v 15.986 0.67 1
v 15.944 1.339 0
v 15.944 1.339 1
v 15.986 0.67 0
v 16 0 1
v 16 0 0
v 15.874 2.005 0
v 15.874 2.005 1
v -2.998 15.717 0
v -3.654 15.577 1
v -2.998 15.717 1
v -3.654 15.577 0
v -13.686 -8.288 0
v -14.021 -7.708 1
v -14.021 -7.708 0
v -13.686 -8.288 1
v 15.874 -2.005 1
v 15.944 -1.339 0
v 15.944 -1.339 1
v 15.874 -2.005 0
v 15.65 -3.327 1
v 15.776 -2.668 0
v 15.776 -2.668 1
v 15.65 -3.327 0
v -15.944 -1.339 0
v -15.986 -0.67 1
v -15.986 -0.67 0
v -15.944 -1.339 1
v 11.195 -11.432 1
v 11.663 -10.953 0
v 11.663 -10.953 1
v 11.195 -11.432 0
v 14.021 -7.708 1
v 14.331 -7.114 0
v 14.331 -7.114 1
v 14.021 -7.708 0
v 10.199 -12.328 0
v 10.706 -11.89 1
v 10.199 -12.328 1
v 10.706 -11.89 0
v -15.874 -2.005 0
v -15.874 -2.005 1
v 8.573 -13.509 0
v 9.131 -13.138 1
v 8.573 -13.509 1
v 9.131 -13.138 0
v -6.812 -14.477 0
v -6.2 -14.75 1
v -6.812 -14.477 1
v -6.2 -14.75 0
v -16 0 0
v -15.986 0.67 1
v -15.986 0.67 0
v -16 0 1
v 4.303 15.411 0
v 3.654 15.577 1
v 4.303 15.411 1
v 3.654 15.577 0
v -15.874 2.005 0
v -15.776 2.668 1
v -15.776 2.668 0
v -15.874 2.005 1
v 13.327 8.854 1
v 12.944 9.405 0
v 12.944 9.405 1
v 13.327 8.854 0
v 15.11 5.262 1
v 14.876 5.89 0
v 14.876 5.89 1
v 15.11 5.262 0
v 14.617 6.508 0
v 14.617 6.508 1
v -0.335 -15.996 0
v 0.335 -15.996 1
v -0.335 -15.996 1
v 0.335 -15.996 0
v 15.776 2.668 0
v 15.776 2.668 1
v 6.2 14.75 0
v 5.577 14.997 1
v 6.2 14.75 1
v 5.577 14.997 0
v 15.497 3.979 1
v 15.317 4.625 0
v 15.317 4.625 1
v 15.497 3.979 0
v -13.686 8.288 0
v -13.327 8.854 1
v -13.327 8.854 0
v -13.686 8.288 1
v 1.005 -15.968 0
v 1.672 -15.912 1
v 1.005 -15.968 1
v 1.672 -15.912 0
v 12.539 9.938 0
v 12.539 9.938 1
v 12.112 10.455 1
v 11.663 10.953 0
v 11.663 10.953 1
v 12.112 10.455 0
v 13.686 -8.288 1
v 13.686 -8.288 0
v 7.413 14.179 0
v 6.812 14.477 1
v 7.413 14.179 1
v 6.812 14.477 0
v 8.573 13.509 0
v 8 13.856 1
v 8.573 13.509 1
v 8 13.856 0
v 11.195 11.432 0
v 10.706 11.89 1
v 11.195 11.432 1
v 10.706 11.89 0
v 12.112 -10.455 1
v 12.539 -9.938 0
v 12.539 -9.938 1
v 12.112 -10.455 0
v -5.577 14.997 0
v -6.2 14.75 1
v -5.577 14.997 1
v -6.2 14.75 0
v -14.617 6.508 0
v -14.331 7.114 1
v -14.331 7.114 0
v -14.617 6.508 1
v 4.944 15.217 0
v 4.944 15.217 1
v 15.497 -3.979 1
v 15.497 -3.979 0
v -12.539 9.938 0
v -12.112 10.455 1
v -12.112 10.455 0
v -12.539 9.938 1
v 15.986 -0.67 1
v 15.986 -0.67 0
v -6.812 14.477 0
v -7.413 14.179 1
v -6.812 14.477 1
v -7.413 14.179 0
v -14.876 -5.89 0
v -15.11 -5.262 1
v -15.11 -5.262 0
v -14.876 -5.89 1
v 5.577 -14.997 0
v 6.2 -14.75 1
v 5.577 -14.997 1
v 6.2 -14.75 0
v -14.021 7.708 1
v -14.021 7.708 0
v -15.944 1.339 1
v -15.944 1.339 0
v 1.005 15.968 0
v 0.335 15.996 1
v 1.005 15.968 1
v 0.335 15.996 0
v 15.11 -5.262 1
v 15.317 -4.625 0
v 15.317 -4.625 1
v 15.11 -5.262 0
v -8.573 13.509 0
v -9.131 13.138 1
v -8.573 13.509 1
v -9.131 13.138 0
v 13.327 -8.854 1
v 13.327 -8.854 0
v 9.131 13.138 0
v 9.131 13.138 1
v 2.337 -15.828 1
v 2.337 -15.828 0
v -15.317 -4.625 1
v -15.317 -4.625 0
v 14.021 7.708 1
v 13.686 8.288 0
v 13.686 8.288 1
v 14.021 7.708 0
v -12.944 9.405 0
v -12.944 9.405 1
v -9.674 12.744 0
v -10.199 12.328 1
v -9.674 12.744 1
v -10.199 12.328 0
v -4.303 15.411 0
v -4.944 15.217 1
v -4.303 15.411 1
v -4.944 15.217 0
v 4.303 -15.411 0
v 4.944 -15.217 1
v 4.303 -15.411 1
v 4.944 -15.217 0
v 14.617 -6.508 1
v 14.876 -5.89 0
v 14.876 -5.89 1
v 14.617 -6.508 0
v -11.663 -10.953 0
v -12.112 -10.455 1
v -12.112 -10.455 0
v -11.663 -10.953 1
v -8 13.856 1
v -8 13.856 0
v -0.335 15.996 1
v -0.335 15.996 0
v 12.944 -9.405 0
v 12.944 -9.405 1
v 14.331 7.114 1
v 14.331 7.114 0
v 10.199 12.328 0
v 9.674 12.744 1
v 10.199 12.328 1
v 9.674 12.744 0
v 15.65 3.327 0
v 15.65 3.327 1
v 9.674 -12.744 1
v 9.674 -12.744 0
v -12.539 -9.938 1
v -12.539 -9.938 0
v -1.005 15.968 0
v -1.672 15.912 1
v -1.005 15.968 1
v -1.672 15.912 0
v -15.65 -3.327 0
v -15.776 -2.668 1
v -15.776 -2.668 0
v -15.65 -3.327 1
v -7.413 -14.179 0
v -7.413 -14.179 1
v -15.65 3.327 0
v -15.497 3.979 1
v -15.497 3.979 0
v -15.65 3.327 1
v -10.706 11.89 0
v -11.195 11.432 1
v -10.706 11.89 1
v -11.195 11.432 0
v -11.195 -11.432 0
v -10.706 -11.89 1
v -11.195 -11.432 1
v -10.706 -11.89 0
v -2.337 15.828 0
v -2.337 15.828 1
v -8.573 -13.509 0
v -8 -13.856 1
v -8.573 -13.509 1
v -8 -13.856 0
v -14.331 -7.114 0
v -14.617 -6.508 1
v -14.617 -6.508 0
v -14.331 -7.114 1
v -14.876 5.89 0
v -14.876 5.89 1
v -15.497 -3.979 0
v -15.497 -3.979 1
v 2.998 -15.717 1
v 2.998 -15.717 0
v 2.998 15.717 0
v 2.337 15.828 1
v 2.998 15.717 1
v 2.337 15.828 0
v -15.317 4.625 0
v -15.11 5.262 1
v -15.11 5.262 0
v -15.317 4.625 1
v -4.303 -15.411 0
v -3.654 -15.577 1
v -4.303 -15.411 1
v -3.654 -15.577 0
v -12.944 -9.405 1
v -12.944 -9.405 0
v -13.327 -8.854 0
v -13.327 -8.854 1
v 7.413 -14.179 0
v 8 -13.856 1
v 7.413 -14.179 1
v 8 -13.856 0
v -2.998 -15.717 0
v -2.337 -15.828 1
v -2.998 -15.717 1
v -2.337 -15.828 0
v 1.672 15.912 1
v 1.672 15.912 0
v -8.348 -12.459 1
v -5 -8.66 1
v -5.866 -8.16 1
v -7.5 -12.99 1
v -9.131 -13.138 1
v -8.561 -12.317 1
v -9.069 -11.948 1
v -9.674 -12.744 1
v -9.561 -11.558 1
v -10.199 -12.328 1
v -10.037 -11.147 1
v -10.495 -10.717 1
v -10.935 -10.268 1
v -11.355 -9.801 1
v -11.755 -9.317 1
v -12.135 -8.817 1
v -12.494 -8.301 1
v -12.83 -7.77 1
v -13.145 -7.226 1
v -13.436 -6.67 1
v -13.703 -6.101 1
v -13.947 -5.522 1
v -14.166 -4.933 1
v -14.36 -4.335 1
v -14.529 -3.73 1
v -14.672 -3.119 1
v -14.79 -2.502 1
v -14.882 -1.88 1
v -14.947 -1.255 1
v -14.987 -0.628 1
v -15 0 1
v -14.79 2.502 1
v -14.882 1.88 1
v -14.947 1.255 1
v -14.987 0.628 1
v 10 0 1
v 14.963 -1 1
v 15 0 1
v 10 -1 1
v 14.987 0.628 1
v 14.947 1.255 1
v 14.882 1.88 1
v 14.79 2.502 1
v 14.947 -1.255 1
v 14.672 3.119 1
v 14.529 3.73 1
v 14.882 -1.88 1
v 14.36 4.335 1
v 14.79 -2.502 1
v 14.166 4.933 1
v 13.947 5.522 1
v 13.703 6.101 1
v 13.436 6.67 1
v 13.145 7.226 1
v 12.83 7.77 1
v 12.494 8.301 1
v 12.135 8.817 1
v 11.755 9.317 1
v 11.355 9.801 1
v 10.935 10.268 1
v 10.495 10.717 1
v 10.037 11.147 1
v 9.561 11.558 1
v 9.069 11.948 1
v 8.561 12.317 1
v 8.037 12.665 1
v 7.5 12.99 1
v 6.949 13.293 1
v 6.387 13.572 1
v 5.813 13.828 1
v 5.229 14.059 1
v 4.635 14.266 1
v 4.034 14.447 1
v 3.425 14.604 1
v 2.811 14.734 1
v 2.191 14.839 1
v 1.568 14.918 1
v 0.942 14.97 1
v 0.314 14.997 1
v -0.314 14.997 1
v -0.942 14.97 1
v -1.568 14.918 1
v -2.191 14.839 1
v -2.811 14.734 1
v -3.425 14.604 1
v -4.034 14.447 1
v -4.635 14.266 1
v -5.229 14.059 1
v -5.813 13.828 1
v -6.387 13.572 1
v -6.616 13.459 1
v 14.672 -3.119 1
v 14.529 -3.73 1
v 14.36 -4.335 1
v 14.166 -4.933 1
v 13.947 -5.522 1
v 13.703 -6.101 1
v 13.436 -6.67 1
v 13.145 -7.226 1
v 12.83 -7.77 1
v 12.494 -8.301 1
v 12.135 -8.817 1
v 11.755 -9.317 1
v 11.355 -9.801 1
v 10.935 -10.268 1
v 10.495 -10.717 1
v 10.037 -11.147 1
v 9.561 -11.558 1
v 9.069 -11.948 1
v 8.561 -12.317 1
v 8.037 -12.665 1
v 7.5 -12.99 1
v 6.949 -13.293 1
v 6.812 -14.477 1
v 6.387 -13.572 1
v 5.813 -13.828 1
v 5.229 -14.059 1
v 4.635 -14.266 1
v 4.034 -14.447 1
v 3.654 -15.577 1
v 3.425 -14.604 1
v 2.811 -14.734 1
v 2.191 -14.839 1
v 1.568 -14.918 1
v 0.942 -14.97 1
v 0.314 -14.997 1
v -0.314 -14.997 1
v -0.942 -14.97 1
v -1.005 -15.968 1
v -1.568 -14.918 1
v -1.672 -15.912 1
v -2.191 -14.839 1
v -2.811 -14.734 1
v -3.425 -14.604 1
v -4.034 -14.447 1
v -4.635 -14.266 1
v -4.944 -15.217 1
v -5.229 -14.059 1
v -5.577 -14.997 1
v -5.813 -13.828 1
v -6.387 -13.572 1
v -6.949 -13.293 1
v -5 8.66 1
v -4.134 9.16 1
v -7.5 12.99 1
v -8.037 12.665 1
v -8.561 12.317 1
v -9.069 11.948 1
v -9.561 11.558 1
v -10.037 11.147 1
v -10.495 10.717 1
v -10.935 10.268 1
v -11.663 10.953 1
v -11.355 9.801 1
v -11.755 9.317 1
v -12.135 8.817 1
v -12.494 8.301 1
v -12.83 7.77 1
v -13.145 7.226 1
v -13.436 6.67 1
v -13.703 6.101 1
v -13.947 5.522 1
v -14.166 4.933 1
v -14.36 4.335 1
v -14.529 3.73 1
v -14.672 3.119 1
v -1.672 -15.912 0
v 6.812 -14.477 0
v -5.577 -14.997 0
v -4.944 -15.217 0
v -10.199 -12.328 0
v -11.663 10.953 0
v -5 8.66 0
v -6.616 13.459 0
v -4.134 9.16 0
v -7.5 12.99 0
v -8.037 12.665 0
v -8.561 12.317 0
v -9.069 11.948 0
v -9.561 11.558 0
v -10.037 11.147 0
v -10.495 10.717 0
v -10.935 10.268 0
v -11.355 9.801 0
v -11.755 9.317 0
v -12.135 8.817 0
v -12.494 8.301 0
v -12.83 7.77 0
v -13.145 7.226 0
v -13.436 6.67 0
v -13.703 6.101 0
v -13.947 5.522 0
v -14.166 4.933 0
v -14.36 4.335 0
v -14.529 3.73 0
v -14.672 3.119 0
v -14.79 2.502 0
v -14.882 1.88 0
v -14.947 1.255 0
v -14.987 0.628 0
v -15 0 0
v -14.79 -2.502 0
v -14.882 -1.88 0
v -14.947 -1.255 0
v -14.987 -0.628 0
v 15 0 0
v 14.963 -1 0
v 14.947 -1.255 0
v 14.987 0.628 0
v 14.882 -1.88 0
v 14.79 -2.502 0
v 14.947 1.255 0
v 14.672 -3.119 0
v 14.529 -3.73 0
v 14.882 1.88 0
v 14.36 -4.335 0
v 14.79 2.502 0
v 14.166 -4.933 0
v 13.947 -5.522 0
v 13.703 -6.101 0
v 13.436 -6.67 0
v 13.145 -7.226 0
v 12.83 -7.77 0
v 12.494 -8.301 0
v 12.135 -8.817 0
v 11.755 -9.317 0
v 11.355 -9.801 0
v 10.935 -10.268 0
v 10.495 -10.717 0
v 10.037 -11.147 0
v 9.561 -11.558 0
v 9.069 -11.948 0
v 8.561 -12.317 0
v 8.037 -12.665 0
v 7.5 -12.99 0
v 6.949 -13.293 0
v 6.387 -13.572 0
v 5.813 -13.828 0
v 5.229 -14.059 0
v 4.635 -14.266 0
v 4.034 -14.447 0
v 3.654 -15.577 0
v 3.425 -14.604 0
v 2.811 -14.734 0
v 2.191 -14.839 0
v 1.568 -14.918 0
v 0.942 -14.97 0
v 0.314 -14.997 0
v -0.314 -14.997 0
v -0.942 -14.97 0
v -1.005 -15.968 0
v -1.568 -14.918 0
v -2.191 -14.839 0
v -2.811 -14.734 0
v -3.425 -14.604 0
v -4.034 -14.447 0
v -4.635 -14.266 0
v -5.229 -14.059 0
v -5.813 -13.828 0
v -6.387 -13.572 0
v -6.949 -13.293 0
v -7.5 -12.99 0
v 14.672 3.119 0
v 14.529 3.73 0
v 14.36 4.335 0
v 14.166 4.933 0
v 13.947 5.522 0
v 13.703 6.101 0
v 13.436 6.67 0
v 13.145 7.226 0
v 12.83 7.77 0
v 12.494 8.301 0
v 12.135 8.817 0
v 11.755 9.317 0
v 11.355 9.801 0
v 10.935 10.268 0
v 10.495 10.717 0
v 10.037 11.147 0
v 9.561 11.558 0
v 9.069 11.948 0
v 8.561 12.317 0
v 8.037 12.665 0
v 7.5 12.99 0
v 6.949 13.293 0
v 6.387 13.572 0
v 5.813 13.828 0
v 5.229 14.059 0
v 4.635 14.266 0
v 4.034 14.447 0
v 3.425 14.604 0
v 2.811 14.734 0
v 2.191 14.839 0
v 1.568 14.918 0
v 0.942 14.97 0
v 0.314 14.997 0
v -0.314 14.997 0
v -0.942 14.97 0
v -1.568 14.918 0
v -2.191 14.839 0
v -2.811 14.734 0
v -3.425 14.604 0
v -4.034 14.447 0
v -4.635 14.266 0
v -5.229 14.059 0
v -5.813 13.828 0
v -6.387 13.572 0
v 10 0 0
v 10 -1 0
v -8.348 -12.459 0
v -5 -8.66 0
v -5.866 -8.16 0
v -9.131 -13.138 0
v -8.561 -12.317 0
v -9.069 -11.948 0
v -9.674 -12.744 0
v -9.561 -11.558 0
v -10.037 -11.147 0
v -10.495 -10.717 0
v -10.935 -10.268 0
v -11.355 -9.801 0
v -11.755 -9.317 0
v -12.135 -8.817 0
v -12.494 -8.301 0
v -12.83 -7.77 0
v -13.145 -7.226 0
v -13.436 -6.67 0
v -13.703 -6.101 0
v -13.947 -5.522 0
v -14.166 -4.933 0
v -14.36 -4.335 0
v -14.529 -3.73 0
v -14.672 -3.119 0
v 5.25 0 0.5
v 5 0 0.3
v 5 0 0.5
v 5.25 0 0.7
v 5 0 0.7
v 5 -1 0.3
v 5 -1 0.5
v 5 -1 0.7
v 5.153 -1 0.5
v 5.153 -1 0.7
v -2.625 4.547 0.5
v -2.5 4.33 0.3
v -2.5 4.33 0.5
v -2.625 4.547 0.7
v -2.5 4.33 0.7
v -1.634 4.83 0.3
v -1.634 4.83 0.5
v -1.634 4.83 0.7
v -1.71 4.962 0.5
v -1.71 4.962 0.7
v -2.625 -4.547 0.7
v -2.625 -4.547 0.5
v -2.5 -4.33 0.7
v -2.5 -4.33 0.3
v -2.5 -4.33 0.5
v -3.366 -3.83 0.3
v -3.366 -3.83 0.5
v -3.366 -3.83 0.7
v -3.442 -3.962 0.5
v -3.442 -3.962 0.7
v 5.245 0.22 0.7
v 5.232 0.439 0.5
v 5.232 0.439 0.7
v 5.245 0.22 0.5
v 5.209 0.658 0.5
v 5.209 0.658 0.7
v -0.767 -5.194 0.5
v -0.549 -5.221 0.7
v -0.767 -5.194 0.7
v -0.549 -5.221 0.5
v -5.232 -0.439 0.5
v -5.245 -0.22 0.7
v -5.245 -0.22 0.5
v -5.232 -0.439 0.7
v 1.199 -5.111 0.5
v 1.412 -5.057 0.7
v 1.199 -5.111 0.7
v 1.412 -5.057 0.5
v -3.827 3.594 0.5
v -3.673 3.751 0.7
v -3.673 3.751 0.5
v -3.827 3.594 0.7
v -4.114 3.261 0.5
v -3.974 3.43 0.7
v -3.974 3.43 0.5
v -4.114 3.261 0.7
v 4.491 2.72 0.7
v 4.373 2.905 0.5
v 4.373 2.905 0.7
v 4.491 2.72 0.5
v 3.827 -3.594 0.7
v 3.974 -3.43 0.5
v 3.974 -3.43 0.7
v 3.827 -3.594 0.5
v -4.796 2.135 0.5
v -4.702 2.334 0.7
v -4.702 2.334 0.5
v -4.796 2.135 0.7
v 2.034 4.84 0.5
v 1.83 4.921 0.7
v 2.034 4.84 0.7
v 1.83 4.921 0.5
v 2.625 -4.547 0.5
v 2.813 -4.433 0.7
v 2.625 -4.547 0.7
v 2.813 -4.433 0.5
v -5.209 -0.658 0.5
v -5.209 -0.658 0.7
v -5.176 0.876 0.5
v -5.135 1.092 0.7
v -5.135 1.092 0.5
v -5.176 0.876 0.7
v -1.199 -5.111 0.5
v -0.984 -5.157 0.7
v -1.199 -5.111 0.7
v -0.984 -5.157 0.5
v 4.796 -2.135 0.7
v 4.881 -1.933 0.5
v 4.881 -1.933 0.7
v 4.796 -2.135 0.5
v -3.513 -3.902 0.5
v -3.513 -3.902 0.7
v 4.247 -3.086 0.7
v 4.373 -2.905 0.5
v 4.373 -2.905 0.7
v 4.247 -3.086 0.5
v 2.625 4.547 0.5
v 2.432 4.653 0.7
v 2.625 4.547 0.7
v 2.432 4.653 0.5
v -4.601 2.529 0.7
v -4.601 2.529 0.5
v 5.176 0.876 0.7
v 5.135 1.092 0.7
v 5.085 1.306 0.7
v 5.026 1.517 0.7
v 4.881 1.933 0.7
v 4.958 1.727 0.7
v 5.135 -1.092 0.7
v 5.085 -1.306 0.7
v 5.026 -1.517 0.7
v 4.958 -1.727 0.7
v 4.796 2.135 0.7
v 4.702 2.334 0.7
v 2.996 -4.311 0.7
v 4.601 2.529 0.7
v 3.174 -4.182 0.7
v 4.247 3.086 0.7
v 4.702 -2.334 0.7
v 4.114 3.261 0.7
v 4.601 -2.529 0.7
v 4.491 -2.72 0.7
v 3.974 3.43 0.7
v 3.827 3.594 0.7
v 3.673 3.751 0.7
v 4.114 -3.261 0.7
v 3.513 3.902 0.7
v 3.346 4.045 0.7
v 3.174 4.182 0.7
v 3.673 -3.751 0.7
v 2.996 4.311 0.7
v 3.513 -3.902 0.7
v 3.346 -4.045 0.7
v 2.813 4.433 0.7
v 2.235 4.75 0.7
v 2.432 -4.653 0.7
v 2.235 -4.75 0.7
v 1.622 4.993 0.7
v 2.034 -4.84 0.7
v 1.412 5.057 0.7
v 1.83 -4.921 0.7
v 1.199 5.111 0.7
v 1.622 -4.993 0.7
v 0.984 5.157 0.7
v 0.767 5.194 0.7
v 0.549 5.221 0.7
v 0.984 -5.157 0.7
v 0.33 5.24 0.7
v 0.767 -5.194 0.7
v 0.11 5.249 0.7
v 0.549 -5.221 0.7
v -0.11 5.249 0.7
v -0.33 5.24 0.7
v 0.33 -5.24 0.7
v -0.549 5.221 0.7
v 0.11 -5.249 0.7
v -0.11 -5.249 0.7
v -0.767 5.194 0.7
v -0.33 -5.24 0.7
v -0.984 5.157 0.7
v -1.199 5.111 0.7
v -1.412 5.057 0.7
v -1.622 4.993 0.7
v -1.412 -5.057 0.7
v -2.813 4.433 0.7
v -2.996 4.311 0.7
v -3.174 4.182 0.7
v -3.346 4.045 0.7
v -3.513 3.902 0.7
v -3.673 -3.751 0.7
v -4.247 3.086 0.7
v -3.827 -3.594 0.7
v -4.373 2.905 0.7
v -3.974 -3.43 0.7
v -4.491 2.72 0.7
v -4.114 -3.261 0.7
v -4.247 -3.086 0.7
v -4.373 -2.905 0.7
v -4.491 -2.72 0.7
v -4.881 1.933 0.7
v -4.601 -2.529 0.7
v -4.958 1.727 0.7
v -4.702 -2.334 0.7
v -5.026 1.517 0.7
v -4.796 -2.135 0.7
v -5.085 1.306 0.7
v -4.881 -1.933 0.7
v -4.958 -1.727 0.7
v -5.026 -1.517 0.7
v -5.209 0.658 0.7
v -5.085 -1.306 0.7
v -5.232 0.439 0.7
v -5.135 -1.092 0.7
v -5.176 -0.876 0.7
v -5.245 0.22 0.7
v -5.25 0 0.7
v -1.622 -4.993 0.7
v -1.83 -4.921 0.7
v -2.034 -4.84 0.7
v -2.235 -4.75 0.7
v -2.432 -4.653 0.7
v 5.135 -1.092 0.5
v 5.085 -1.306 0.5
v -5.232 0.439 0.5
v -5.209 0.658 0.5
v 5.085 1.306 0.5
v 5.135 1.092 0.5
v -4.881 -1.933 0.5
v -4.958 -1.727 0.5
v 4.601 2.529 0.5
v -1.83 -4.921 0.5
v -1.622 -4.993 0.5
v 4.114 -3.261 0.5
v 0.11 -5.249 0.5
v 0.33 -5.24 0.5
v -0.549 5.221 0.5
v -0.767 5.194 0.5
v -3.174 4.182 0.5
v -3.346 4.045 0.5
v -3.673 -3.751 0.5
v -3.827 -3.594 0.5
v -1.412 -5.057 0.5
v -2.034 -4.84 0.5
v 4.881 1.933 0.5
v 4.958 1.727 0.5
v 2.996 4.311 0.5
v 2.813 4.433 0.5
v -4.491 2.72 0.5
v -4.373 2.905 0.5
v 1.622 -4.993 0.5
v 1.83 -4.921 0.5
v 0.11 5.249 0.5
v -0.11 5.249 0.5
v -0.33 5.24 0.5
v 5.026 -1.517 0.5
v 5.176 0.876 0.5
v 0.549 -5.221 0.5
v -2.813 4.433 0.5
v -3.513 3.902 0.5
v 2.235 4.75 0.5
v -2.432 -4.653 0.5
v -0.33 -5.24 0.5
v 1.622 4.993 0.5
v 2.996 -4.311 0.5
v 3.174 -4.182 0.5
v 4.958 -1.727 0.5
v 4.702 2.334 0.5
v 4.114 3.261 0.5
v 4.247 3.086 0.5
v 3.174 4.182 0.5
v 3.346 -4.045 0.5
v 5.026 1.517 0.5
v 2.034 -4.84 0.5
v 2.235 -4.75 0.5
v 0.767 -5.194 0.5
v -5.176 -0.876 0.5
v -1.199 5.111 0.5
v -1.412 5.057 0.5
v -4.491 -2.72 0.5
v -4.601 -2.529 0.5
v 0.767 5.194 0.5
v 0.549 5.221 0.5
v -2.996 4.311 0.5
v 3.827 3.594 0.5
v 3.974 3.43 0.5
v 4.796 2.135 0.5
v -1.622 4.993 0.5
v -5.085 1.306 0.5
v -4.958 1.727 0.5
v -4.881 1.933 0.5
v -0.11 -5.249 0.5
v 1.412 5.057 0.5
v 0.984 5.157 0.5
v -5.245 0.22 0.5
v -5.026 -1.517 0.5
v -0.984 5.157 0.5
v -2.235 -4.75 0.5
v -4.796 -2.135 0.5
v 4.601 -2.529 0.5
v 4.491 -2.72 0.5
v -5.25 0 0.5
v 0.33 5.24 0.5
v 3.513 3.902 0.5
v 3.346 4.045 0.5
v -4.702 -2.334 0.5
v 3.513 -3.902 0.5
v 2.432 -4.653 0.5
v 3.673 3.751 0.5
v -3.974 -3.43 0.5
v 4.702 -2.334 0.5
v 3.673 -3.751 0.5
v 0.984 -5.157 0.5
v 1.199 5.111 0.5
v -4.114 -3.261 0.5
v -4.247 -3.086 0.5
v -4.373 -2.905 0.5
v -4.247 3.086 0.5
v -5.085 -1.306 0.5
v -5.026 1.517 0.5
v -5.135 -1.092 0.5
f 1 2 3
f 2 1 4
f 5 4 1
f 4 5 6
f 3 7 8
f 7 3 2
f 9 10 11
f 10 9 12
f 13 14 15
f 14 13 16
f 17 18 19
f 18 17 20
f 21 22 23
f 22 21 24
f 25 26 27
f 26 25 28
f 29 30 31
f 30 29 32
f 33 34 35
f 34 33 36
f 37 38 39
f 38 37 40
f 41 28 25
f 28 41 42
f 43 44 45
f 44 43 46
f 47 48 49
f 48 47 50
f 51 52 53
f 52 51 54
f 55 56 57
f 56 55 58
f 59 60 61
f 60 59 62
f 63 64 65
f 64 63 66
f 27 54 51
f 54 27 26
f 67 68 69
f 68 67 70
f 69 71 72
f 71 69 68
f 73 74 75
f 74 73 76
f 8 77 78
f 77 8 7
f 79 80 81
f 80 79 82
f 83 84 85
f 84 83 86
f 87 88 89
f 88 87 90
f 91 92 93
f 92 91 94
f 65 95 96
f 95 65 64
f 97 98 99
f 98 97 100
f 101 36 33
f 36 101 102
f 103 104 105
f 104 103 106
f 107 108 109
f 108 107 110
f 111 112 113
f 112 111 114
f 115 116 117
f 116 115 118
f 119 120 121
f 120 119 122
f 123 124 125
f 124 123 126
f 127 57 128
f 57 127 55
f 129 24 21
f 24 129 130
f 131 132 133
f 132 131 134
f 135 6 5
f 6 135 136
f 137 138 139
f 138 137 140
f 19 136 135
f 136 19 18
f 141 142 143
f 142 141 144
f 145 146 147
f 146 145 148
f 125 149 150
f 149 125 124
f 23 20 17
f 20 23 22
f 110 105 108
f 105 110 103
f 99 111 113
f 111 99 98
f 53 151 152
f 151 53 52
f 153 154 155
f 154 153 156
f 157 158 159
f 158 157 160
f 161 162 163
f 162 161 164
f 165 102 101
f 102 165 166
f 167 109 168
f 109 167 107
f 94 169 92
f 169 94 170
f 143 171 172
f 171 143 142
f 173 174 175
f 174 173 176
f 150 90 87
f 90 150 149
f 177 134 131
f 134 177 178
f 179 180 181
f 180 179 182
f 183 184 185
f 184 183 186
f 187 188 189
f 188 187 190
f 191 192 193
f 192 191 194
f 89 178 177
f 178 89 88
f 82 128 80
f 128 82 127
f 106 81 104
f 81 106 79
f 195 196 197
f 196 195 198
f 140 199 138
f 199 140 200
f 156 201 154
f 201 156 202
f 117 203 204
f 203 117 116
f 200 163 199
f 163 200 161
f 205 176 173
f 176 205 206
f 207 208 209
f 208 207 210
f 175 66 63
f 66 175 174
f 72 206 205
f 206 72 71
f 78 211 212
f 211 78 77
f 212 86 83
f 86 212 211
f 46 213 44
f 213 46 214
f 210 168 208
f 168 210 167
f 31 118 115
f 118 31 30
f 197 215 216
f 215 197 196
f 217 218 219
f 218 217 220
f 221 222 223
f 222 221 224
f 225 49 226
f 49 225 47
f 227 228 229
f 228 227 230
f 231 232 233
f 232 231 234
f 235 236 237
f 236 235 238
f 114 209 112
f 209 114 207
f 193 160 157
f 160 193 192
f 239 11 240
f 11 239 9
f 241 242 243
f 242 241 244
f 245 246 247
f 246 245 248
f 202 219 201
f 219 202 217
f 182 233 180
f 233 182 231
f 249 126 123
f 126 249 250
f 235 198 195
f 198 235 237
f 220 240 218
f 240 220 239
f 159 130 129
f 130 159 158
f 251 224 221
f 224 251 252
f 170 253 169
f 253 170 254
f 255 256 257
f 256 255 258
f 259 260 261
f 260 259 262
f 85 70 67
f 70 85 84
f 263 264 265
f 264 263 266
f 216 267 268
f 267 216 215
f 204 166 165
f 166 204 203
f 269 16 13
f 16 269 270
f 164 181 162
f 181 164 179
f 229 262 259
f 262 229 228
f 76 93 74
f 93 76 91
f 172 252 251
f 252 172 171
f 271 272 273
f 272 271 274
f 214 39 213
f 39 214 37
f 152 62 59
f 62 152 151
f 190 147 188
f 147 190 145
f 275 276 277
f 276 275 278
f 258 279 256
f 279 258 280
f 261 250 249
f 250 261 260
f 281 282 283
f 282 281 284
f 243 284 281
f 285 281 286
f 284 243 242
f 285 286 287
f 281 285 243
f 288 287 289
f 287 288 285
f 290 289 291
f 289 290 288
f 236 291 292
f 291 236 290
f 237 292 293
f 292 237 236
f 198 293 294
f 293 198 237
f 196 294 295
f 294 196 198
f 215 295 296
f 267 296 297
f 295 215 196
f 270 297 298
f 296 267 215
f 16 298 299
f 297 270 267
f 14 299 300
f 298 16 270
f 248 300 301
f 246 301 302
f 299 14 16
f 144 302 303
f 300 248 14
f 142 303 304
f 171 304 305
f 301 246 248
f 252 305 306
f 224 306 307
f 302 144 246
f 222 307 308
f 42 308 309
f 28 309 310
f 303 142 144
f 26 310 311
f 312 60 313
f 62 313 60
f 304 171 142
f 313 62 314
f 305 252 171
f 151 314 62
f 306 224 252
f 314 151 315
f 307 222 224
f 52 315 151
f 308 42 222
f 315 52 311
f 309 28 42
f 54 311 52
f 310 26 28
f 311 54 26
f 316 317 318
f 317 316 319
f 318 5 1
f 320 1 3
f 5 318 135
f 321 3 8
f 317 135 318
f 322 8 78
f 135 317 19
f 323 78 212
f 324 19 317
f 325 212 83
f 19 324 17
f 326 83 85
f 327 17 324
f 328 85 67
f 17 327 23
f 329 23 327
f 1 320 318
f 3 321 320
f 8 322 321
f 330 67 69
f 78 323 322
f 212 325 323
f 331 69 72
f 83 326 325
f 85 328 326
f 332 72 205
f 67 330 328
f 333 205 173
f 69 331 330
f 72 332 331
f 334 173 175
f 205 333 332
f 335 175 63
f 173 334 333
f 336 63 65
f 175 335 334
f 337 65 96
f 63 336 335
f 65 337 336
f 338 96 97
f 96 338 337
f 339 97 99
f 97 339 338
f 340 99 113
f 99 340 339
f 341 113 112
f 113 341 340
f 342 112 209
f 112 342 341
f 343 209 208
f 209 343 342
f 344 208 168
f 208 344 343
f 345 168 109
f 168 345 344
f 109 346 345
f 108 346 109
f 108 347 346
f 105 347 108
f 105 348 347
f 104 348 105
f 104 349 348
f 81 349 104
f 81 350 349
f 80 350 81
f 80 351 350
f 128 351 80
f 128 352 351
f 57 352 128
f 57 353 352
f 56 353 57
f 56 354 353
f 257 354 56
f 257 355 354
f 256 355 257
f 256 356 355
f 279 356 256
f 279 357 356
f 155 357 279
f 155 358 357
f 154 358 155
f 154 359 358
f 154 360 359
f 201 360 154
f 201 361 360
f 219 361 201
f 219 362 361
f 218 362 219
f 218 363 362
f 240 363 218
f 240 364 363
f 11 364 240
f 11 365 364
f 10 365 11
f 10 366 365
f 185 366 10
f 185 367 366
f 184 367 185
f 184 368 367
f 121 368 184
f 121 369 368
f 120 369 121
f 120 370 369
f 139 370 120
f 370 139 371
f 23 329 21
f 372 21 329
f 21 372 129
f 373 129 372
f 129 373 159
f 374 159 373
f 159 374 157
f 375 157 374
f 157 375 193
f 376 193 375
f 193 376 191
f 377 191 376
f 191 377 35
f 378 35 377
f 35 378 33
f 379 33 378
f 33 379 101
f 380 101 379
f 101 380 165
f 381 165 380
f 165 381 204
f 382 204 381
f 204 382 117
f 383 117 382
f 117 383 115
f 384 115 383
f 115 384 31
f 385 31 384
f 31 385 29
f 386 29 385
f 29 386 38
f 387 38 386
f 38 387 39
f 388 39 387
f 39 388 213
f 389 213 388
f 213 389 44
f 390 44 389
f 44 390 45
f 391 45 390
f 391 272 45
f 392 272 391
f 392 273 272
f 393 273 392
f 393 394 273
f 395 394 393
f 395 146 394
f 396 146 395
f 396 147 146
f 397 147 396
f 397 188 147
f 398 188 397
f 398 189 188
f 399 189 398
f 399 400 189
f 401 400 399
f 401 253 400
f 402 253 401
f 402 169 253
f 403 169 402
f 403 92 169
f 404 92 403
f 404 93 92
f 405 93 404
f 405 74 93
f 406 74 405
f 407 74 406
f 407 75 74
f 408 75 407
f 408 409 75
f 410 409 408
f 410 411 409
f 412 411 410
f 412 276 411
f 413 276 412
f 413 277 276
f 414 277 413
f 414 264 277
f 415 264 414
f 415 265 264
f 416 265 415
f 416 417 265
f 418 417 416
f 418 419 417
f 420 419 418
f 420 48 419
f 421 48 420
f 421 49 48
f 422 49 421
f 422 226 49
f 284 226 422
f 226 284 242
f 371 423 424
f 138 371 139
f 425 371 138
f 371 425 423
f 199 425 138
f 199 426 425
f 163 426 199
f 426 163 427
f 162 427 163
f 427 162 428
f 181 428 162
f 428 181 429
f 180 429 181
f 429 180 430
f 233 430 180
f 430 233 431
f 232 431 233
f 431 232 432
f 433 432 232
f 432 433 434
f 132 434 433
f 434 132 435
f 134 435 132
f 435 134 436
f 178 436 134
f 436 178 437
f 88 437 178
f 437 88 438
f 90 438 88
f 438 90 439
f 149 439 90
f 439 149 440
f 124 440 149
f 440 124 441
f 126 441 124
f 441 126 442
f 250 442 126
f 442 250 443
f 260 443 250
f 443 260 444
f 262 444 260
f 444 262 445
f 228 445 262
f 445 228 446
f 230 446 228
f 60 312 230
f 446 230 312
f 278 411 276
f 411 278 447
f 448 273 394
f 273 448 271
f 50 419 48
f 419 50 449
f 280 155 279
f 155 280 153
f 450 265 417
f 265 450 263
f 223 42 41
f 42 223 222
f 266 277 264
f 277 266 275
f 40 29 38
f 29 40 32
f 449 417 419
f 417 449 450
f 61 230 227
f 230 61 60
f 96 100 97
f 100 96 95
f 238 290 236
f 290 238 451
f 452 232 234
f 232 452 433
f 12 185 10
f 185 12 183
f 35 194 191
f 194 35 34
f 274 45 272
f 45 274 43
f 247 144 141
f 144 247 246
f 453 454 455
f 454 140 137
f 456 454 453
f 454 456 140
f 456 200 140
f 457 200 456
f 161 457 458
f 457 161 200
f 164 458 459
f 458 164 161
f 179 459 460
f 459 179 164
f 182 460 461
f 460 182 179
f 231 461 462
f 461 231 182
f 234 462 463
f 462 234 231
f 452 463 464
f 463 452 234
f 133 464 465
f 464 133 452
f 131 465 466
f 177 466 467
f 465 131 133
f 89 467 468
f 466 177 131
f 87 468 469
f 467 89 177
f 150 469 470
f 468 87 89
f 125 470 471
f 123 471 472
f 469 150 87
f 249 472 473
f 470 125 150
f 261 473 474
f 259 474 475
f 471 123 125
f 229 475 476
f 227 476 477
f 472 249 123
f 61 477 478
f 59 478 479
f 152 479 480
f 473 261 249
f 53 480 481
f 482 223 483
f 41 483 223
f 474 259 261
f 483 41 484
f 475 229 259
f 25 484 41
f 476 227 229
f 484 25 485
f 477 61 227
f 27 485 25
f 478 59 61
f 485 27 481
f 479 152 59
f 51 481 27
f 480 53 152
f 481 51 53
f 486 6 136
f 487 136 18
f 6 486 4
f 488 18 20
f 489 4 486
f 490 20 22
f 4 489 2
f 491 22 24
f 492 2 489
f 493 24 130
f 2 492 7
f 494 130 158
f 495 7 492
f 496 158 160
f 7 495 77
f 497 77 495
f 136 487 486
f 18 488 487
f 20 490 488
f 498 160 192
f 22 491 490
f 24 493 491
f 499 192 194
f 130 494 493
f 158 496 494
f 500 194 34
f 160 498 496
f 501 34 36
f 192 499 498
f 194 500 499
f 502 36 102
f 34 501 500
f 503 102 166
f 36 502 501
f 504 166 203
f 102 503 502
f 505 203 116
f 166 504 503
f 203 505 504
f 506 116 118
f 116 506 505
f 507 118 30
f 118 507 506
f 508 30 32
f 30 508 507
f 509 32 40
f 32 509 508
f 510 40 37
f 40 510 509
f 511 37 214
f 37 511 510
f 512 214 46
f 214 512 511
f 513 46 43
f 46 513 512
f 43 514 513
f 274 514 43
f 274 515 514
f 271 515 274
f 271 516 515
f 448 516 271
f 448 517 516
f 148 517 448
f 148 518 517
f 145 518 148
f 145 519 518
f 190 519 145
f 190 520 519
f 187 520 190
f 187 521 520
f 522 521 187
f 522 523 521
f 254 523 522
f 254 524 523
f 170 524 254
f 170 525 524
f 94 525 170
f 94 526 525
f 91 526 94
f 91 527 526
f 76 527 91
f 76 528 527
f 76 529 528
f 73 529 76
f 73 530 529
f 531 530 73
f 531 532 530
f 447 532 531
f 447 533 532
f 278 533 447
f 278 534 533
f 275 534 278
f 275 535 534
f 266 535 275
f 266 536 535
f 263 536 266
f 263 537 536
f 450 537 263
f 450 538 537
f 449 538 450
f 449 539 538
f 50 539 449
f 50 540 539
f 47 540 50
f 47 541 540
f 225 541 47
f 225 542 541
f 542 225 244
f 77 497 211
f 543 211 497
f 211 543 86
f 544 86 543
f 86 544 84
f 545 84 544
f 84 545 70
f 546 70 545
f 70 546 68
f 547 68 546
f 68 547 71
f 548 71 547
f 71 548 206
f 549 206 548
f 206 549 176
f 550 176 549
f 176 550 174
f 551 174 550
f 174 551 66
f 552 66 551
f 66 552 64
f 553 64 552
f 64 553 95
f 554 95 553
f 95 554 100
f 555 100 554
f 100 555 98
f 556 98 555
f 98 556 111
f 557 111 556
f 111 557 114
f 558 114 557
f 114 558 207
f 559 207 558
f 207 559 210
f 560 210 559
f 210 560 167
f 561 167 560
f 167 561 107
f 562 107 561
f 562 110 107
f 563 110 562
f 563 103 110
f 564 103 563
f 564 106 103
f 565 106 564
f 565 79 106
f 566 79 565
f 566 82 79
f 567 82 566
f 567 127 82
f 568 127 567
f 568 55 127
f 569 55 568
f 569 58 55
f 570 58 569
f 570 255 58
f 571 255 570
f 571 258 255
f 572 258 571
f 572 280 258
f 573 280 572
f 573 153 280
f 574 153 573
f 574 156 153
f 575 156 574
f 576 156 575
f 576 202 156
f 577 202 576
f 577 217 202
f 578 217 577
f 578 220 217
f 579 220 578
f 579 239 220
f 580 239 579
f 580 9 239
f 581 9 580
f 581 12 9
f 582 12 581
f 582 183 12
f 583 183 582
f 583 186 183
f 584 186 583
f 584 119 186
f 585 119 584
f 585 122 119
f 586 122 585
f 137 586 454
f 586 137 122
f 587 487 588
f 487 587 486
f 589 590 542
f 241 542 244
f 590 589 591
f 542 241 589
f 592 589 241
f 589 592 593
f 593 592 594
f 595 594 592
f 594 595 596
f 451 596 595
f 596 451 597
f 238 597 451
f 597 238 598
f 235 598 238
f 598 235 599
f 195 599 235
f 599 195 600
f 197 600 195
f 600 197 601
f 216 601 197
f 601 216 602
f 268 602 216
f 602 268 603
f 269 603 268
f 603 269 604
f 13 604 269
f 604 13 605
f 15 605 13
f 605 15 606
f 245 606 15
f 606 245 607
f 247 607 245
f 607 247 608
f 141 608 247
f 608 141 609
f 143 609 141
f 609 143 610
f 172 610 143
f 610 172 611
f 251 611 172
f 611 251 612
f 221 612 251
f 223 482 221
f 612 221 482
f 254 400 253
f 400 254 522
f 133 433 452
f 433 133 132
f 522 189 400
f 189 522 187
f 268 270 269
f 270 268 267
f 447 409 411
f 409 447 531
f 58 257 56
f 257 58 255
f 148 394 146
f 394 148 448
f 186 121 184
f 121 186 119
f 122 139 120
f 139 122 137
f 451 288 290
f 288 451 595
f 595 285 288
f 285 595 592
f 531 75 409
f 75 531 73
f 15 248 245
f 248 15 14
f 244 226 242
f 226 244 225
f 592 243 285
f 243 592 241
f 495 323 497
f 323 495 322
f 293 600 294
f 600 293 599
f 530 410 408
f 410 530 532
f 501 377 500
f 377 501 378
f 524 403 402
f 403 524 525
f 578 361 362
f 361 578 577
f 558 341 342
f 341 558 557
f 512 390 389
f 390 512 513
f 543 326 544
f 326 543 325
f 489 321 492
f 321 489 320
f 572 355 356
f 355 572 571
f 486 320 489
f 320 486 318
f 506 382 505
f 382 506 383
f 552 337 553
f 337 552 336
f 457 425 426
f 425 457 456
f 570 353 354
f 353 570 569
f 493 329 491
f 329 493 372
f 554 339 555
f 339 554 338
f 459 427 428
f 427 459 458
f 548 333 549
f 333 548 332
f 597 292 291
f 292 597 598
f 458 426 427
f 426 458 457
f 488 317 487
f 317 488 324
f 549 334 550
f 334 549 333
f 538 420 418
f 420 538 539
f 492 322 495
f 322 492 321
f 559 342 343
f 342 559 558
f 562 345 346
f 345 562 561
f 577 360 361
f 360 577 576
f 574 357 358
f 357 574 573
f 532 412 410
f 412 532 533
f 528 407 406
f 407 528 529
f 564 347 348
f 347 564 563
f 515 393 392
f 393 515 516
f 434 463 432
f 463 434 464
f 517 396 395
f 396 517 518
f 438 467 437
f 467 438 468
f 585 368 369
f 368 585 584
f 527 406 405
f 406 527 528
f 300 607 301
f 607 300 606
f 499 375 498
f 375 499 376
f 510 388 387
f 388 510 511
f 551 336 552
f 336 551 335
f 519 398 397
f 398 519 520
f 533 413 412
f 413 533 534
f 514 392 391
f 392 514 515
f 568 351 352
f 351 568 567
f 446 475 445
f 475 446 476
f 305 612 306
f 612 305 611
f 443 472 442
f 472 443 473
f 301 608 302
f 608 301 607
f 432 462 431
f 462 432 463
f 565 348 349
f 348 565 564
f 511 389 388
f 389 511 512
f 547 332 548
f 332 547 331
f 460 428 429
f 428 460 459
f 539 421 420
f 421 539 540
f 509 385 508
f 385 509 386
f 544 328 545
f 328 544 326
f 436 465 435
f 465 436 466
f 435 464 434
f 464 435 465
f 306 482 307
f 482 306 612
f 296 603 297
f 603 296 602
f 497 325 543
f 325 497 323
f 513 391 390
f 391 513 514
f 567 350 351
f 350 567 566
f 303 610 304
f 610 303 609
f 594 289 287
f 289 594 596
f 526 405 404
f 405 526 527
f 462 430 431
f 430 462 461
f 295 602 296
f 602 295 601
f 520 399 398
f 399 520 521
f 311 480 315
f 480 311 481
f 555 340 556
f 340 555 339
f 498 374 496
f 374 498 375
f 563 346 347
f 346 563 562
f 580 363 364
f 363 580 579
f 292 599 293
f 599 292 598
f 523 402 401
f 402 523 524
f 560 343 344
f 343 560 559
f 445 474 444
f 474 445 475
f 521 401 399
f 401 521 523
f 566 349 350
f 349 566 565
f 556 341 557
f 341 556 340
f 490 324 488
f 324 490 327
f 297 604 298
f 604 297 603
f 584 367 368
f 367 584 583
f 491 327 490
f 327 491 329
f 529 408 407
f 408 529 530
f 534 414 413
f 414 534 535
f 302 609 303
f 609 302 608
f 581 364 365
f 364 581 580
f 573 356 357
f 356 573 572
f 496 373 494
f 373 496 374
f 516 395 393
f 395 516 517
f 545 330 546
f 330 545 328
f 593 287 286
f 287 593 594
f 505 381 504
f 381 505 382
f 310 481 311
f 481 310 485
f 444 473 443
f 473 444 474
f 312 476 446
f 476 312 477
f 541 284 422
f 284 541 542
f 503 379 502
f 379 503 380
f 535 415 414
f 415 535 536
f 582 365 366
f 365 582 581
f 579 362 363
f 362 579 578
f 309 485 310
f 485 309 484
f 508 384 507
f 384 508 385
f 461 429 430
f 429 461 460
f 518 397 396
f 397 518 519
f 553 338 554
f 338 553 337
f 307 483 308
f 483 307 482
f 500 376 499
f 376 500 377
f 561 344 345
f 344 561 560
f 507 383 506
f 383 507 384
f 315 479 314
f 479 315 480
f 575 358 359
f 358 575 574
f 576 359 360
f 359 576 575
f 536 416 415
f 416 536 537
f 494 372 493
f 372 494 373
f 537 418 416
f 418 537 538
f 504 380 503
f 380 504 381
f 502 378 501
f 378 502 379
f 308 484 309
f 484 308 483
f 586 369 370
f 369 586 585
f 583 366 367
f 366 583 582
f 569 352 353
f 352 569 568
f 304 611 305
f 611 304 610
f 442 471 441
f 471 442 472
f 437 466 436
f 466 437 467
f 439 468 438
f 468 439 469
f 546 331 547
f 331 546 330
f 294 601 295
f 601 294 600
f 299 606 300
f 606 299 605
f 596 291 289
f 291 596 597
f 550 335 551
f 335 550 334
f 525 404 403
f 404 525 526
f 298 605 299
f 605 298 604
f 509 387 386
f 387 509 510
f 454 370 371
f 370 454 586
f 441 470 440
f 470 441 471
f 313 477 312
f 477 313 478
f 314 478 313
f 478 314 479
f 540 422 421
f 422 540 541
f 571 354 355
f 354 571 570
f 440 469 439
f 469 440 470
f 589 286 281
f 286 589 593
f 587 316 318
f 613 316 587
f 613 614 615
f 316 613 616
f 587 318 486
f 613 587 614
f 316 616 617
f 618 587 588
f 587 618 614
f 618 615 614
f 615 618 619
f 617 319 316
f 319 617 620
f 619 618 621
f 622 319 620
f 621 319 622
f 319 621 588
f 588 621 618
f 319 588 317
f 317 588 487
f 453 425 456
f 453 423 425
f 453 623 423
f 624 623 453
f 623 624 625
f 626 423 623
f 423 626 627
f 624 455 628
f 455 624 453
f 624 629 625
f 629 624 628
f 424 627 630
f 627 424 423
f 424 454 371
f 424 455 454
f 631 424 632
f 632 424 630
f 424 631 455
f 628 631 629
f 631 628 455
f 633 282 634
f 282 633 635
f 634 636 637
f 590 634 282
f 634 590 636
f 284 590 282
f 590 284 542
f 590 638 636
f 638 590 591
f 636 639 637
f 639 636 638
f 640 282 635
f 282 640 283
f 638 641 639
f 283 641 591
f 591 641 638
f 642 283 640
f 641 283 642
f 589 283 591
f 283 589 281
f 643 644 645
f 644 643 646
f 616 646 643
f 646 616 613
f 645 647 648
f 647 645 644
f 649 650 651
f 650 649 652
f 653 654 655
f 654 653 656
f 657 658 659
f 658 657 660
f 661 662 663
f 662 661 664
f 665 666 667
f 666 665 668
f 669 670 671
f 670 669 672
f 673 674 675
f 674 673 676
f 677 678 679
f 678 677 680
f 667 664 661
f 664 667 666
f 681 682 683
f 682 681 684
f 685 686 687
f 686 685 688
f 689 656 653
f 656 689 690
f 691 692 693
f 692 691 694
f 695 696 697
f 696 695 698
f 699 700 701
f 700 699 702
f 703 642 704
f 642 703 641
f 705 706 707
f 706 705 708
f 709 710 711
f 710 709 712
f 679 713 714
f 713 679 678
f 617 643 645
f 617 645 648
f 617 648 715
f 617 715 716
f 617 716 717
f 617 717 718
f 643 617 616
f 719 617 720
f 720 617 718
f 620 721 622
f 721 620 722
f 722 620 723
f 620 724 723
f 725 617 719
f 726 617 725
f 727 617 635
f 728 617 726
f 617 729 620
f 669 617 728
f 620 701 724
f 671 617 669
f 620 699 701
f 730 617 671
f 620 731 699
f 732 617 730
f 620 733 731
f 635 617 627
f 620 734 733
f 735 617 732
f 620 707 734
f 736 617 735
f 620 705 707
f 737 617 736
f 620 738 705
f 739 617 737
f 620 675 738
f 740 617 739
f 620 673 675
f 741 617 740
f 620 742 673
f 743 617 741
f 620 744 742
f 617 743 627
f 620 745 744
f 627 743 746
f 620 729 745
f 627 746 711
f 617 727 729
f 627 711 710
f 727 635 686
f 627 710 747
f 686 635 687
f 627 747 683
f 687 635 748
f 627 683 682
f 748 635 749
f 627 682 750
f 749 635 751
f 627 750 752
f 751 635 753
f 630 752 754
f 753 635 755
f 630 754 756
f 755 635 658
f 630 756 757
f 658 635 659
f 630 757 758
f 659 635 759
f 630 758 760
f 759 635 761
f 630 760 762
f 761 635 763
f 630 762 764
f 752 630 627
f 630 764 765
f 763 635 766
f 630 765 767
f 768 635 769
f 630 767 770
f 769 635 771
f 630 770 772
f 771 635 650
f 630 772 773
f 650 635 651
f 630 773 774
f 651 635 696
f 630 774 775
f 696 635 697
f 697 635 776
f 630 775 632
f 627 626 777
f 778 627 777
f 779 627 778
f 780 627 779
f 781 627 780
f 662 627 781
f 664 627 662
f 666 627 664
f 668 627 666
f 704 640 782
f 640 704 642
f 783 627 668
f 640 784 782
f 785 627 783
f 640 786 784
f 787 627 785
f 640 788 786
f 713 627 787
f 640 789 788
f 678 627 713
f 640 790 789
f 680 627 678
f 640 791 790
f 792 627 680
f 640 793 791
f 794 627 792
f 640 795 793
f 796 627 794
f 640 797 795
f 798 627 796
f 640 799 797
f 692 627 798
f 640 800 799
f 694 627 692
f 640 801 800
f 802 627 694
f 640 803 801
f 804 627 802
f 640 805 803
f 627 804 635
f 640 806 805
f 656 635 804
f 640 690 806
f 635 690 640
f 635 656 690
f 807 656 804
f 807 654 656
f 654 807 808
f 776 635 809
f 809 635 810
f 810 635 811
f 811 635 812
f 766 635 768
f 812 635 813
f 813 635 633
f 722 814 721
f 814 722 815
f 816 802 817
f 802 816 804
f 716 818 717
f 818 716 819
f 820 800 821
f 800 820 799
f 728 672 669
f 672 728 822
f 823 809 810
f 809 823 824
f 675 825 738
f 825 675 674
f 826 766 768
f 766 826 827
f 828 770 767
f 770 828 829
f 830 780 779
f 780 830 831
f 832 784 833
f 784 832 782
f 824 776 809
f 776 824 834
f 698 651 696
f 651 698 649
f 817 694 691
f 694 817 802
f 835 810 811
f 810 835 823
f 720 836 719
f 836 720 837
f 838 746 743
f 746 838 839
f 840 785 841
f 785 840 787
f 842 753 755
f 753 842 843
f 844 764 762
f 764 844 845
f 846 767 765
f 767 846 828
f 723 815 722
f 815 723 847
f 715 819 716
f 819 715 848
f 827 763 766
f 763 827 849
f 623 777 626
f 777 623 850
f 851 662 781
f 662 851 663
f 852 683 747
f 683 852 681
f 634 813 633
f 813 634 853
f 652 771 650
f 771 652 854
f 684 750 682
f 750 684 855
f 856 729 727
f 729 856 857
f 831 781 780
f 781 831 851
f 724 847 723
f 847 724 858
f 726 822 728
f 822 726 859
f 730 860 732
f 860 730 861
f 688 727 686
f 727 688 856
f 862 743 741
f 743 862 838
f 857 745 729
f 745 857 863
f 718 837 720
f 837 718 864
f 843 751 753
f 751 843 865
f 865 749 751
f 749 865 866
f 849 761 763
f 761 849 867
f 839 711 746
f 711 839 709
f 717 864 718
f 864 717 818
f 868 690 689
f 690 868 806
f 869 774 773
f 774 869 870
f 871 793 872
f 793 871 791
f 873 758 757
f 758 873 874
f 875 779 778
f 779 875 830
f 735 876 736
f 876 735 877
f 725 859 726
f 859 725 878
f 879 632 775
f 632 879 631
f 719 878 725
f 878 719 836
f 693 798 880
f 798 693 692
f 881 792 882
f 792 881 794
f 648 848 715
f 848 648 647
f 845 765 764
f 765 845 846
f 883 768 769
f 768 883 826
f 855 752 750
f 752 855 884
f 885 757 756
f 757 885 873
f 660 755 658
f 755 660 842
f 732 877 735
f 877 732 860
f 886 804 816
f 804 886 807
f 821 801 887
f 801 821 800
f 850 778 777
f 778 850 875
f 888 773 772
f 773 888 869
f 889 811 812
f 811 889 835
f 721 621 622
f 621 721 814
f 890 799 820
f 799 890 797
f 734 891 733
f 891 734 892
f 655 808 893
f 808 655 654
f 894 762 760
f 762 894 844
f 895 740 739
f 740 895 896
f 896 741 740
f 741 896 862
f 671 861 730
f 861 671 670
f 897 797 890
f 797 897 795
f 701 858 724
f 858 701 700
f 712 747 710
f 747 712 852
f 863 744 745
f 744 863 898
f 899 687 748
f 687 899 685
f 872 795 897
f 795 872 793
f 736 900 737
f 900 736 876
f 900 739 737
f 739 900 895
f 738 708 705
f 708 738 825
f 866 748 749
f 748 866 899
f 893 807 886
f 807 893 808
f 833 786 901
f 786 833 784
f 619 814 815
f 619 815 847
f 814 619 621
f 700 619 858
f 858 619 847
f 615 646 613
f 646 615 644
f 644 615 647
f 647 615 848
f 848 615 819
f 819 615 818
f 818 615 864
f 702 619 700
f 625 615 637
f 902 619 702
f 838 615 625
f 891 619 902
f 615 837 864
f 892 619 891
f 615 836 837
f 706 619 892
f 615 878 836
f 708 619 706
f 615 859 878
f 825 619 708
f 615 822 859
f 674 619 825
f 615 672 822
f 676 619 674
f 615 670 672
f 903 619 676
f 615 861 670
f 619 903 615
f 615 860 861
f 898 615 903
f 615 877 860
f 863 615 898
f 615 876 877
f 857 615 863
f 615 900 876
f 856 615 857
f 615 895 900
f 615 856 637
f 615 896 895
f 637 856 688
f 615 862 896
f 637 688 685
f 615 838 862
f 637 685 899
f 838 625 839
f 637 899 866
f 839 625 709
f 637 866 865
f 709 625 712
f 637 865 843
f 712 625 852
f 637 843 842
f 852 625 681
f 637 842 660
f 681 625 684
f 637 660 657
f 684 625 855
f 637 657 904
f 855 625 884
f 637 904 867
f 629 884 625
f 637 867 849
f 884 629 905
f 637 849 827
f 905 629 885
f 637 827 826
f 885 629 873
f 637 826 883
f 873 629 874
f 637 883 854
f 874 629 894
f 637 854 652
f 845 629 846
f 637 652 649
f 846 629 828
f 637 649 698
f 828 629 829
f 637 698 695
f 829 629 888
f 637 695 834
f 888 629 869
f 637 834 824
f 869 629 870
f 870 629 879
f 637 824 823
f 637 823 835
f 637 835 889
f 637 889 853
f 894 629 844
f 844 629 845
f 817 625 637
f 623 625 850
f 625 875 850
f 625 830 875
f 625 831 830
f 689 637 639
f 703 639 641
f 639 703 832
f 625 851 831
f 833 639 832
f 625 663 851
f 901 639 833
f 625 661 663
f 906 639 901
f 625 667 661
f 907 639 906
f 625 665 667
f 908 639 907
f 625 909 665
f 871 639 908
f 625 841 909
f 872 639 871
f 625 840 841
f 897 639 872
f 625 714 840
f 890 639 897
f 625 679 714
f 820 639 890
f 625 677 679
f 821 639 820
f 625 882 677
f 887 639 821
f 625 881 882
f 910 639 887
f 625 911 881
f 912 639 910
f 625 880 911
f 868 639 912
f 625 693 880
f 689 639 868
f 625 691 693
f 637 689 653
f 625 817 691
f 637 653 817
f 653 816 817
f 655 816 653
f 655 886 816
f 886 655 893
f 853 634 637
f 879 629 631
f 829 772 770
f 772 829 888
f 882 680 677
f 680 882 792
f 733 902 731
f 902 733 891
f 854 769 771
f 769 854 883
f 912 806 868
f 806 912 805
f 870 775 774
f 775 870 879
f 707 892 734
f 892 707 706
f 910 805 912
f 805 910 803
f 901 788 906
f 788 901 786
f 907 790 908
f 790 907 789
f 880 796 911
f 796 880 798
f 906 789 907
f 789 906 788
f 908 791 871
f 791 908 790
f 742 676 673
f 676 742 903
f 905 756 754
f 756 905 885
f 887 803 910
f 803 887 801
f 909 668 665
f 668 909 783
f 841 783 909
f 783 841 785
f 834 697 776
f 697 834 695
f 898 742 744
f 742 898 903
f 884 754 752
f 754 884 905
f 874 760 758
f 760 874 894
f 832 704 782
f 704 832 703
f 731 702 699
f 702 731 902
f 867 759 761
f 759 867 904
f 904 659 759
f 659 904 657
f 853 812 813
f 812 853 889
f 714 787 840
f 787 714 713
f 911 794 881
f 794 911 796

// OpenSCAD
/* 
                            Rheinberg FiltersFilters v2.0
                   

An open source filter for a costume Rheinberg Filters hat can be adapted to any compound microscope.

This 3D file is designed to be an optical filter for contrast illumination Technics for microscopy enthusiast and professionals.
     
Source :https://github.com/Usuy-Leon/DIY_Dark-Field-Filters

This project is an Open Source project,
by Usuy D. Leon, 2025.10.14
Microscopist, National University of Colombia, Bogota DC,

    */
/*                        -  Parameters -                             */
height = 1;              // Total height of the filter
outer_dia = 32;      // Outer diameter of the main structure
inner_dia = 10;       // Diameter of the light-blocking center cylinder

Inner_heigh = 0.2;           // Thickness of the inner patch in the center
border_thickness = 2;    // Thickness of the outer border
$fn = 150;                      // Resolution

/*                      - Arms Characteristics -                          */
number_arms = 3;         // Less arms = more light and information
arm_thickness = 1;        // Arm width
transition_length = 5;   // How long the taper extends from the inner circle

/*                            - Filter Build -                    */

// Border ring
border_inner_dia = outer_dia - border_thickness;

difference() {
    cylinder(h=height, d=outer_dia);
    cylinder(h=height+0.1, d=border_inner_dia);
}

// Inner blocking circle
translate([0, 0, arm_thickness/2])
    cylinder(h=Inner_heigh, d=inner_dia+0.5);

// Smooth arms
for (i = [0:number_arms-1]) {
    rotate([90, 0, i*(360/number_arms)]) {
        arm_with_smooth_transition();
    }
}

/* ------------------- Modules ------------------- */

// Arm with continuous slope connection
module arm_with_smooth_transition() {
    arm_length = (border_inner_dia/2 - inner_dia/2) - transition_length;

    union() {
        // Smooth taper section (inner to arm)
        translate([inner_dia/2,  arm_thickness/2, 0])
            linear_extrude(height=height)
                polygon(points=[
                    [0, -arm_thickness*0.2],
                    [0,  arm_thickness*0.2],
                    [transition_length,  arm_thickness/2],
                    [transition_length, -arm_thickness/2]
                ]);

        // Main flat part of the arm
        translate([inner_dia/2 + transition_length, -arm_thickness*0, 0])
            cube([arm_length, arm_thickness, height]);
    }
}
